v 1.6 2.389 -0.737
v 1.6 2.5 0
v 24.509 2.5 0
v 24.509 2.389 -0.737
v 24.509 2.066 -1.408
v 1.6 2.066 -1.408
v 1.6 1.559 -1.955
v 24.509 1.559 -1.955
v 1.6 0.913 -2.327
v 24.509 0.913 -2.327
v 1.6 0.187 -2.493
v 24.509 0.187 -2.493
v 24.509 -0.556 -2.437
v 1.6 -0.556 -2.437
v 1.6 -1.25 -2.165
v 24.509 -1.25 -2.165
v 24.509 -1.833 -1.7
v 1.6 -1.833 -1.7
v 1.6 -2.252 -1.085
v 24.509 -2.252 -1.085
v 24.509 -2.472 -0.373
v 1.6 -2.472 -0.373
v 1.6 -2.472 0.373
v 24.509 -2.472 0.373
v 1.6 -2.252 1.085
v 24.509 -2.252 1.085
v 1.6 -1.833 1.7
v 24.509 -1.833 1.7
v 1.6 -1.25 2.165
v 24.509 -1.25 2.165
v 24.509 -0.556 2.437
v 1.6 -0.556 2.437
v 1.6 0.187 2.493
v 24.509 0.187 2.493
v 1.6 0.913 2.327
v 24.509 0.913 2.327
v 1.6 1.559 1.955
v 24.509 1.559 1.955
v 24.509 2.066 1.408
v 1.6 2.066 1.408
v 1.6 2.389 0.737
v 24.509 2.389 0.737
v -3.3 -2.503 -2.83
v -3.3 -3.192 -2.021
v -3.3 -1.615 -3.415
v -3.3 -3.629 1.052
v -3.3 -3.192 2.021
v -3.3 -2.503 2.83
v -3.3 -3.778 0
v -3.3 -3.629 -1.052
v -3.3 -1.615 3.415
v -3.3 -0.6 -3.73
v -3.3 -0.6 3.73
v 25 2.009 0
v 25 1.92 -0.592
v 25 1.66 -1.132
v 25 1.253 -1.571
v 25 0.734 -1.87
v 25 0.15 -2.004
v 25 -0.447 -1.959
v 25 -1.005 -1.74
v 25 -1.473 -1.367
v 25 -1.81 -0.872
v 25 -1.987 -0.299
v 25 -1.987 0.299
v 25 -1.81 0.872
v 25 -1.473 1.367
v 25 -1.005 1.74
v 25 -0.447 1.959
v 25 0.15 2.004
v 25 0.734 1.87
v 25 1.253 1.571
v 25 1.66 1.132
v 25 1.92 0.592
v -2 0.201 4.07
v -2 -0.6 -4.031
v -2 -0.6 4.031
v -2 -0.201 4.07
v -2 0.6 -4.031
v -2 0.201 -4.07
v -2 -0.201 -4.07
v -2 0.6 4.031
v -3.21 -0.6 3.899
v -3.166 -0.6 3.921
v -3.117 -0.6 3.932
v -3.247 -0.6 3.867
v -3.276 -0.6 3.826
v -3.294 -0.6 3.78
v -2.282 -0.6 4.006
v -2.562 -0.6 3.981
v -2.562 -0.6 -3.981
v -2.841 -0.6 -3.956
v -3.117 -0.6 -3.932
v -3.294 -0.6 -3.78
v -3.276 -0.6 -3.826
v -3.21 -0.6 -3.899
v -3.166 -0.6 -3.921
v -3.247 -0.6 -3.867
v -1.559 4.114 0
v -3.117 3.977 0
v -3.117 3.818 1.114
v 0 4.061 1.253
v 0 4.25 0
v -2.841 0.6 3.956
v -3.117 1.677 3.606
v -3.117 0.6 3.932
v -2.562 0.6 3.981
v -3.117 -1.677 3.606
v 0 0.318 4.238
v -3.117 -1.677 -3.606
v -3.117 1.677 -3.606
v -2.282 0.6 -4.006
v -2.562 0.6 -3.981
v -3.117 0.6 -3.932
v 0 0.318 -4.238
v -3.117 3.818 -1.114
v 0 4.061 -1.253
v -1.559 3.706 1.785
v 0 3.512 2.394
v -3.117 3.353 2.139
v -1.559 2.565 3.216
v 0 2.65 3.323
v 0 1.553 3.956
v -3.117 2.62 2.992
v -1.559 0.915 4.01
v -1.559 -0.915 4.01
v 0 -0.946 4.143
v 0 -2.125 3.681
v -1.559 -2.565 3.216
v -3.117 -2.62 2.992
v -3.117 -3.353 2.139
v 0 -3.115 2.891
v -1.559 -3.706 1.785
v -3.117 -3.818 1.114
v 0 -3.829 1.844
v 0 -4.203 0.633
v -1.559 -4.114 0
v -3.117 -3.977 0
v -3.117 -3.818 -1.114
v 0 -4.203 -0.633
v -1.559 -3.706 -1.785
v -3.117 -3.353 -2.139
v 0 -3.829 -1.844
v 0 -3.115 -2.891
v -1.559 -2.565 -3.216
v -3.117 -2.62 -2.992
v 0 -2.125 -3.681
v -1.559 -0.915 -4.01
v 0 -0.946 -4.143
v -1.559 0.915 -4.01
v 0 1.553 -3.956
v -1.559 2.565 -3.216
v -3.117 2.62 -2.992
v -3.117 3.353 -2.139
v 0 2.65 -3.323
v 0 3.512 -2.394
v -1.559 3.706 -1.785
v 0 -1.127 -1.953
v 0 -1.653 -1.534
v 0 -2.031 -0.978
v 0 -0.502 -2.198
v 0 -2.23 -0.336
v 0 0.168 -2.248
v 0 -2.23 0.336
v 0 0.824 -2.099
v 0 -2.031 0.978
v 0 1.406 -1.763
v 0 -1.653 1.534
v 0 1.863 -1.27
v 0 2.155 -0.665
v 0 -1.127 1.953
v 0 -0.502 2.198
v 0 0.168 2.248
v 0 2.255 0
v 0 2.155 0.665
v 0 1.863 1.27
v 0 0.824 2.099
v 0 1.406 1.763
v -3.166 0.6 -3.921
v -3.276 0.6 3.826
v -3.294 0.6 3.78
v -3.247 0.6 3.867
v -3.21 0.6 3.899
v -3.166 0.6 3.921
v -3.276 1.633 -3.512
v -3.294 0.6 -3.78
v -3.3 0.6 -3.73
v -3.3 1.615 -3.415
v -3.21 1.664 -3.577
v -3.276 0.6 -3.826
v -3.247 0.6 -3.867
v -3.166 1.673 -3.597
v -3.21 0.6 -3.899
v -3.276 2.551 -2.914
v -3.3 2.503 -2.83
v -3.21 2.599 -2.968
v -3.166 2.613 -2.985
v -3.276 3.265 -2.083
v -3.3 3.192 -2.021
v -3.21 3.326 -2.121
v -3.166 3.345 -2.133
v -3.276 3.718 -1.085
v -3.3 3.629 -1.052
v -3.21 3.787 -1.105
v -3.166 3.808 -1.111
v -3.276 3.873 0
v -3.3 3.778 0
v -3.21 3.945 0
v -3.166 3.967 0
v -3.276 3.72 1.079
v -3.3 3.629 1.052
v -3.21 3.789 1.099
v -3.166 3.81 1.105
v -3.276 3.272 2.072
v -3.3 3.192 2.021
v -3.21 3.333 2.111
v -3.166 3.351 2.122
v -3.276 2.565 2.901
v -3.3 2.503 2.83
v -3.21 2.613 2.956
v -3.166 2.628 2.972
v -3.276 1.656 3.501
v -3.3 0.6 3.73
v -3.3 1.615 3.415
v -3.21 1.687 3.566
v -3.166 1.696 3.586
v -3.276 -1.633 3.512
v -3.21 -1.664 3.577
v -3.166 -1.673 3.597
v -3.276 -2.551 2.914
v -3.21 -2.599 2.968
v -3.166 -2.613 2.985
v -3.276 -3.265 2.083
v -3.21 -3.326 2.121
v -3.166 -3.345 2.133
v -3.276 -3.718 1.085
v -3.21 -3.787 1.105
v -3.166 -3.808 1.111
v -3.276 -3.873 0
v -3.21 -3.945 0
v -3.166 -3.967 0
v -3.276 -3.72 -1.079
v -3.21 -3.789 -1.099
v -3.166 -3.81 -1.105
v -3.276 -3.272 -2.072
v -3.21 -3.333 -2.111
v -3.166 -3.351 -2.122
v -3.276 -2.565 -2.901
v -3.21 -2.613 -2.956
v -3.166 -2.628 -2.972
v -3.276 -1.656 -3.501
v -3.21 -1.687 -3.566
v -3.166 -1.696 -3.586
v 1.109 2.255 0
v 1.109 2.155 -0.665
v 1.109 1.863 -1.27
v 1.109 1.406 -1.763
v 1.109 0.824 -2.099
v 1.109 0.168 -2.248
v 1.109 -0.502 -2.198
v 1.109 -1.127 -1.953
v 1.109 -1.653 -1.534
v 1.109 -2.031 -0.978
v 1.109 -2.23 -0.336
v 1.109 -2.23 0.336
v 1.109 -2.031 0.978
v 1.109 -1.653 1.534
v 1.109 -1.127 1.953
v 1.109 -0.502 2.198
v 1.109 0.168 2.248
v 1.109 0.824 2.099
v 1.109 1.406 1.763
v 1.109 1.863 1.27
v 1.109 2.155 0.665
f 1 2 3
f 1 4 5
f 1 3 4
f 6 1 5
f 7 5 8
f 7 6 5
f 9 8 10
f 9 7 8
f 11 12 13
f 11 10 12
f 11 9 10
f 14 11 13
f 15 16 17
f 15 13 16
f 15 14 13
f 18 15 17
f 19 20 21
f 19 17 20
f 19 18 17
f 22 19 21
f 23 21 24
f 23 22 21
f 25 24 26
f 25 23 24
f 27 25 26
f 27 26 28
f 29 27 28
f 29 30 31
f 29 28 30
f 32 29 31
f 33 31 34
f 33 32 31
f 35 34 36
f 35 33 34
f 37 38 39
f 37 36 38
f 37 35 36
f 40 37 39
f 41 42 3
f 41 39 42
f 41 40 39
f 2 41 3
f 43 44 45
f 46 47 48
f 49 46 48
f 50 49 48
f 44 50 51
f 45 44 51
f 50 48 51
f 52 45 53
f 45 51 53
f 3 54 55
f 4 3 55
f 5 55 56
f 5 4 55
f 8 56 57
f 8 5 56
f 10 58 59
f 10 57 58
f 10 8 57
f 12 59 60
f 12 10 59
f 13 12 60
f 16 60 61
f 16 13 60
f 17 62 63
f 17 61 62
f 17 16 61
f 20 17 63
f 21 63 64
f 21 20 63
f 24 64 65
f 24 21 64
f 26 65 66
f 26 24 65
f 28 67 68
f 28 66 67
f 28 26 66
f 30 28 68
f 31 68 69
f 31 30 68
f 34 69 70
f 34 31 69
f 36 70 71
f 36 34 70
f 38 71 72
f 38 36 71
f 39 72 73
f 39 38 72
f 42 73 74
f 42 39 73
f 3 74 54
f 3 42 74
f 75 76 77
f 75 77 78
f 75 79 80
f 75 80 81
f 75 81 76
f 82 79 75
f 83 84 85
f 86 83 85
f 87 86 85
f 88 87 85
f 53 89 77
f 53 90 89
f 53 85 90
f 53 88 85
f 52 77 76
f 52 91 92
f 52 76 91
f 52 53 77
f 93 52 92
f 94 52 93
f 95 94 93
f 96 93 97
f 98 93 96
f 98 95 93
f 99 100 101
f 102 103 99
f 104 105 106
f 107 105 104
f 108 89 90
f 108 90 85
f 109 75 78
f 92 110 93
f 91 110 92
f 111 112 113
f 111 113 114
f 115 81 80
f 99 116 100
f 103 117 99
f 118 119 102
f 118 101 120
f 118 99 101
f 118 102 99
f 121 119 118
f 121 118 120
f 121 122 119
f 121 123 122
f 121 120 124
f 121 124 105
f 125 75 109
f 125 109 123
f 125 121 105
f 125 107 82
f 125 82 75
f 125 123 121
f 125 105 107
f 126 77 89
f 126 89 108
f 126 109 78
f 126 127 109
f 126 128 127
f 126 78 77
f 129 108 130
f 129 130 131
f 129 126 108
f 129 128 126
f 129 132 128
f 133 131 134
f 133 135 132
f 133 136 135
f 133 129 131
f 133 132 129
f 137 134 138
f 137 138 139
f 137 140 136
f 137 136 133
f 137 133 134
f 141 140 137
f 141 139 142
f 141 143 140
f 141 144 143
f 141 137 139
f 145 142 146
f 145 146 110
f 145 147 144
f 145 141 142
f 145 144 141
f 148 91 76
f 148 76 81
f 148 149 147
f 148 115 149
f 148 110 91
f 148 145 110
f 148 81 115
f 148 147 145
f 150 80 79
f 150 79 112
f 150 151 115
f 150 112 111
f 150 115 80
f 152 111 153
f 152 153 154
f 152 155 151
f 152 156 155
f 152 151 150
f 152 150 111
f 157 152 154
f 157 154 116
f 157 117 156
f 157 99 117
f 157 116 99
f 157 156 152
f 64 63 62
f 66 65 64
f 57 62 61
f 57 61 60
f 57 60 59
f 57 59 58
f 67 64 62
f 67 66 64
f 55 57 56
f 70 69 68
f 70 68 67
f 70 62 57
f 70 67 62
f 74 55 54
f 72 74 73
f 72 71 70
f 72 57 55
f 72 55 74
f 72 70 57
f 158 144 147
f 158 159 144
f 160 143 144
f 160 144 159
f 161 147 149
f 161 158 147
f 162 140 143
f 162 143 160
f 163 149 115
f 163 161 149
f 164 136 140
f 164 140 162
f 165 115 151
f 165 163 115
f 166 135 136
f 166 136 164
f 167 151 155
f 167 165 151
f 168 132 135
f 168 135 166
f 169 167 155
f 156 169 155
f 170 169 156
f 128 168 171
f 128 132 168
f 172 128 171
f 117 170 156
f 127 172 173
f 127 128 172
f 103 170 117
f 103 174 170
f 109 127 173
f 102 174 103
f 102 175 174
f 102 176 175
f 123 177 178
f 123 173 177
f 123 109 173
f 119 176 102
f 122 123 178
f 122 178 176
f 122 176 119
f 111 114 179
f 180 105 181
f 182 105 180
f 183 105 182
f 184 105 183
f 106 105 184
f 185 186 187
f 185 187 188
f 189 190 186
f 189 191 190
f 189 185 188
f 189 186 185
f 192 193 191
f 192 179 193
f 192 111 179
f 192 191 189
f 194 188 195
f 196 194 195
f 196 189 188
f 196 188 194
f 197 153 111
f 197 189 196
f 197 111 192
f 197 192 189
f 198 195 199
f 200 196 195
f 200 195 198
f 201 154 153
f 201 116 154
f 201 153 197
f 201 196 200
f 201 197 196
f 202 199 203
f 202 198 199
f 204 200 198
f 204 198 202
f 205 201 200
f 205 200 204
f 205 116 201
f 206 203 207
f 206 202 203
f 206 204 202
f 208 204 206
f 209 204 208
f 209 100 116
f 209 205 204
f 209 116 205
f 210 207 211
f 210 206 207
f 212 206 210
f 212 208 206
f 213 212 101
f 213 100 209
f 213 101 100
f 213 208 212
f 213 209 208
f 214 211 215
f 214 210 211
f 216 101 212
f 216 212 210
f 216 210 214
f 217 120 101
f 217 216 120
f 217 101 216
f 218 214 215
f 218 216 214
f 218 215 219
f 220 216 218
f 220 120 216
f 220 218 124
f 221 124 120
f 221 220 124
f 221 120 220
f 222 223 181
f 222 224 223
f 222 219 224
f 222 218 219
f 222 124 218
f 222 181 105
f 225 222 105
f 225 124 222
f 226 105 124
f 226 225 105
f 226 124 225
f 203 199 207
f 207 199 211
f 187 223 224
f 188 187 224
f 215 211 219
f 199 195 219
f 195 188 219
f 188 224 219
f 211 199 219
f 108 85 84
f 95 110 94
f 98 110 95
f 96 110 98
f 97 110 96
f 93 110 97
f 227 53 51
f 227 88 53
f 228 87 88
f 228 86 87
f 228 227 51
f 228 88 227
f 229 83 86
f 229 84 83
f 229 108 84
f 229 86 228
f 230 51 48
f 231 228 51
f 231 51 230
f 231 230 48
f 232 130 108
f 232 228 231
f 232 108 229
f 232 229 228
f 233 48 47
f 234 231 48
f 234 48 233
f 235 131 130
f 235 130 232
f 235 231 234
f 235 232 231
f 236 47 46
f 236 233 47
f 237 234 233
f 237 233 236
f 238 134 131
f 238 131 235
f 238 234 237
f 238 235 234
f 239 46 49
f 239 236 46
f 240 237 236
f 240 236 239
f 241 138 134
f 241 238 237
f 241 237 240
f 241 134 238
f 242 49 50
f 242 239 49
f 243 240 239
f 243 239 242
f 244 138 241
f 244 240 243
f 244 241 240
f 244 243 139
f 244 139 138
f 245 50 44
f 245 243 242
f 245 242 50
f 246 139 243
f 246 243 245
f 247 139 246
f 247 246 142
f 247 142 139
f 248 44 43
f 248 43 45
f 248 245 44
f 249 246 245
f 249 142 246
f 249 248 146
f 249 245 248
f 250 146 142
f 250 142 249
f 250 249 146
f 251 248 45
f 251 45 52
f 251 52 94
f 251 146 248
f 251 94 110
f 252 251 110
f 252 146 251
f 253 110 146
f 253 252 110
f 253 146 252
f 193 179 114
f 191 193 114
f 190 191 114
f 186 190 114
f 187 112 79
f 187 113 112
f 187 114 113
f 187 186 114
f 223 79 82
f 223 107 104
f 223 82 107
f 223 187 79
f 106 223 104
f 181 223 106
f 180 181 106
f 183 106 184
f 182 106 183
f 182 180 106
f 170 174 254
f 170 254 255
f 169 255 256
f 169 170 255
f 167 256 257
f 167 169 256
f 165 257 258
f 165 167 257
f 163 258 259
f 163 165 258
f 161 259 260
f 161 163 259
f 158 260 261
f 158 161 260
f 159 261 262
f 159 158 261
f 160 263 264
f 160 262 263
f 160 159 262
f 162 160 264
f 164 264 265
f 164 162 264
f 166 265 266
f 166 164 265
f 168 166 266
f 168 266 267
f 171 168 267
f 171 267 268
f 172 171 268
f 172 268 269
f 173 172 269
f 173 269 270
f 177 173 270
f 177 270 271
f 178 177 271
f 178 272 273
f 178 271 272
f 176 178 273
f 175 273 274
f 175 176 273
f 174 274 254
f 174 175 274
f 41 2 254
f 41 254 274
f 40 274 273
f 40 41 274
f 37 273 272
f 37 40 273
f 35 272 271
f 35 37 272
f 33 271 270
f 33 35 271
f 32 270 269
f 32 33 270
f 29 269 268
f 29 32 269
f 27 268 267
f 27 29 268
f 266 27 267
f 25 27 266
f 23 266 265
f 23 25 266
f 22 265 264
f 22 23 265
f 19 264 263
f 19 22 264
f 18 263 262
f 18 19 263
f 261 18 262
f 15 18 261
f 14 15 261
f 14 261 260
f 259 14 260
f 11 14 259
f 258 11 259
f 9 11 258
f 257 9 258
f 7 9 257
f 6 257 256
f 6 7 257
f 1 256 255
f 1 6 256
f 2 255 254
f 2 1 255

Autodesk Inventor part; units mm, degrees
ref_plane "YZ Plane" through (0, 0, 0) normal (1, 0, 0) x (0, 1, 0)
ref_plane "XZ Plane" through (0, 0, 0) normal (0, 1, 0) x (-1, 0, 0)
sketch "Sketch1" plane through (0, 0, 0) normal (0, 0, 1) x (1, 0, 0)
  line L0 (-3.3, 0) -> (25, 0)
  line L1 (25, 0) -> (25, 2.5)
  line L2 (25, 2.5) -> (1.6, 2.5)
  line L3 (1.6, 2.5) -> (1.1091, 2.2547)
  line L4 (1.1091, 2.2547) -> (0, 2.2547)
  line L5 (0, 2.2547) -> (0, 4.25)
  line L6 (-8.96, 0) -> (30.66, 0) projected
  line L7 (0, -0.85) -> (0, 5.1) projected
  line L8 (-3.3, 0) -> (-3.3, 3.9613)
  line L9 (0, 4.25) -> (-3.3, 3.9613)
  line L10 (1.6, 2.5) -> (0, 2.5) construction
  dimension "d0" = 25
  dimension "d1" = 23.4
  dimension "d2" = 0.4909
  dimension "d3" = 3.3
  dimension "d4" = 5
  dimension "d5" = 4.5095
  dimension "d9" = 8.5
  dimension "d10" = 5
revolve "Body" add sketch "Sketch1" angle 360 about axis through (-3.3, 0, 0) along (1, 0, 0)
sketch "Sketch2" plane through (-3.3, 0, 0) normal (-1, 0, 0) x (0, 0, 1)
  circle A0 centre (0, 0) radius 4.25 projected
  line L0 (0, 0) -> (0, 3.9613) projected
  line L1 (-4.25, 0.6) -> (4.25, 0.6)
  line L2 (4.25, 0.6) -> (4.25, -0.6)
  line L3 (4.25, -0.6) -> (-4.25, -0.6)
  line L4 (-4.25, -0.6) -> (-4.25, 0.6)
  line L5 (-4.25, 0) -> (4.25, 0) construction
  line L6 (0, 0.6) -> (0, -0.6) construction
  point P0 (0, 0)
  dimension "d11" = 1.2
  dimension "d12" = 8.5
fillet "Fillet1" radius 0.2 1 edges at (-3.3, -3.9613, 0)
extrude "Slot" cut sketch "Sketch2" against normal blind 1.3 contours A0 L3 L1 | L2 L3 A0 | A0 L1 L2 | A0 L4 L1 | L3 L4 A0
thread "Thread" size "M5x0.8" class "6g" standard "ISO Metric profile" length 23.4
chamfer "Chamfer1" distance 0.4908 distance2 0.4909 1 edges at (25, -2.5, 0) measured on face at (25, 0.6238, 0.5526)
ref_plane "Work Plane1" through (30.1625, 0, 0) normal (0, 0, -1) x (1, 0, 0)
equation "\"d11\" = SBR"
equation "\"d12\" = KOD"
equation "\"d19\" = STI"
equation "\"d14\" = RR"
equation "\"d15\" = GEL"
equation "\"d17\" = -0.5 * SPD + 0.5 * GD"
equation "\"d0\" = NLG"
equation "\"d1\" = GEL"
equation "\"d3\" = KOH"
equation "\"d4\" = GD"
equation "\"d5\" = BDM"
equation "\"d9\" = KOD"
equation "\"d10\" = KEWI"
equation "\"GD\" = NND"
equation "\"NLG\" = 25"
equation "\"GEL\" = 23.4"
equation "\"KOD\" = 8.5"
equation "\"KOH\" = 3.3"
equation "\"GAL\" = 0.61345 * PTC"
equation "\"SPD\" = NND - 1.2269 * PTC"
equation "\"BDM\" = 4.5095"
equation "\"GUL\" = 0.61345 * PTC"
equation "\"RR\" = 0.2"
equation "\"SBR\" = 1.2"
equation "\"STI\" = 1.3"
equation "\"KEWI\" = 5deg"
equation "\"PTC\" = 0.8"
equation "\"THREADDIA\" = 5"
equation "\"TOA\" = 30deg"
equation "\"NND\" = 5"
equation "\"GD1\" = THREADDIA - 1.2269 * PTC"
properties part number "ISO 1207 - M5 x 25" material "Stainless Steel, 440C"
